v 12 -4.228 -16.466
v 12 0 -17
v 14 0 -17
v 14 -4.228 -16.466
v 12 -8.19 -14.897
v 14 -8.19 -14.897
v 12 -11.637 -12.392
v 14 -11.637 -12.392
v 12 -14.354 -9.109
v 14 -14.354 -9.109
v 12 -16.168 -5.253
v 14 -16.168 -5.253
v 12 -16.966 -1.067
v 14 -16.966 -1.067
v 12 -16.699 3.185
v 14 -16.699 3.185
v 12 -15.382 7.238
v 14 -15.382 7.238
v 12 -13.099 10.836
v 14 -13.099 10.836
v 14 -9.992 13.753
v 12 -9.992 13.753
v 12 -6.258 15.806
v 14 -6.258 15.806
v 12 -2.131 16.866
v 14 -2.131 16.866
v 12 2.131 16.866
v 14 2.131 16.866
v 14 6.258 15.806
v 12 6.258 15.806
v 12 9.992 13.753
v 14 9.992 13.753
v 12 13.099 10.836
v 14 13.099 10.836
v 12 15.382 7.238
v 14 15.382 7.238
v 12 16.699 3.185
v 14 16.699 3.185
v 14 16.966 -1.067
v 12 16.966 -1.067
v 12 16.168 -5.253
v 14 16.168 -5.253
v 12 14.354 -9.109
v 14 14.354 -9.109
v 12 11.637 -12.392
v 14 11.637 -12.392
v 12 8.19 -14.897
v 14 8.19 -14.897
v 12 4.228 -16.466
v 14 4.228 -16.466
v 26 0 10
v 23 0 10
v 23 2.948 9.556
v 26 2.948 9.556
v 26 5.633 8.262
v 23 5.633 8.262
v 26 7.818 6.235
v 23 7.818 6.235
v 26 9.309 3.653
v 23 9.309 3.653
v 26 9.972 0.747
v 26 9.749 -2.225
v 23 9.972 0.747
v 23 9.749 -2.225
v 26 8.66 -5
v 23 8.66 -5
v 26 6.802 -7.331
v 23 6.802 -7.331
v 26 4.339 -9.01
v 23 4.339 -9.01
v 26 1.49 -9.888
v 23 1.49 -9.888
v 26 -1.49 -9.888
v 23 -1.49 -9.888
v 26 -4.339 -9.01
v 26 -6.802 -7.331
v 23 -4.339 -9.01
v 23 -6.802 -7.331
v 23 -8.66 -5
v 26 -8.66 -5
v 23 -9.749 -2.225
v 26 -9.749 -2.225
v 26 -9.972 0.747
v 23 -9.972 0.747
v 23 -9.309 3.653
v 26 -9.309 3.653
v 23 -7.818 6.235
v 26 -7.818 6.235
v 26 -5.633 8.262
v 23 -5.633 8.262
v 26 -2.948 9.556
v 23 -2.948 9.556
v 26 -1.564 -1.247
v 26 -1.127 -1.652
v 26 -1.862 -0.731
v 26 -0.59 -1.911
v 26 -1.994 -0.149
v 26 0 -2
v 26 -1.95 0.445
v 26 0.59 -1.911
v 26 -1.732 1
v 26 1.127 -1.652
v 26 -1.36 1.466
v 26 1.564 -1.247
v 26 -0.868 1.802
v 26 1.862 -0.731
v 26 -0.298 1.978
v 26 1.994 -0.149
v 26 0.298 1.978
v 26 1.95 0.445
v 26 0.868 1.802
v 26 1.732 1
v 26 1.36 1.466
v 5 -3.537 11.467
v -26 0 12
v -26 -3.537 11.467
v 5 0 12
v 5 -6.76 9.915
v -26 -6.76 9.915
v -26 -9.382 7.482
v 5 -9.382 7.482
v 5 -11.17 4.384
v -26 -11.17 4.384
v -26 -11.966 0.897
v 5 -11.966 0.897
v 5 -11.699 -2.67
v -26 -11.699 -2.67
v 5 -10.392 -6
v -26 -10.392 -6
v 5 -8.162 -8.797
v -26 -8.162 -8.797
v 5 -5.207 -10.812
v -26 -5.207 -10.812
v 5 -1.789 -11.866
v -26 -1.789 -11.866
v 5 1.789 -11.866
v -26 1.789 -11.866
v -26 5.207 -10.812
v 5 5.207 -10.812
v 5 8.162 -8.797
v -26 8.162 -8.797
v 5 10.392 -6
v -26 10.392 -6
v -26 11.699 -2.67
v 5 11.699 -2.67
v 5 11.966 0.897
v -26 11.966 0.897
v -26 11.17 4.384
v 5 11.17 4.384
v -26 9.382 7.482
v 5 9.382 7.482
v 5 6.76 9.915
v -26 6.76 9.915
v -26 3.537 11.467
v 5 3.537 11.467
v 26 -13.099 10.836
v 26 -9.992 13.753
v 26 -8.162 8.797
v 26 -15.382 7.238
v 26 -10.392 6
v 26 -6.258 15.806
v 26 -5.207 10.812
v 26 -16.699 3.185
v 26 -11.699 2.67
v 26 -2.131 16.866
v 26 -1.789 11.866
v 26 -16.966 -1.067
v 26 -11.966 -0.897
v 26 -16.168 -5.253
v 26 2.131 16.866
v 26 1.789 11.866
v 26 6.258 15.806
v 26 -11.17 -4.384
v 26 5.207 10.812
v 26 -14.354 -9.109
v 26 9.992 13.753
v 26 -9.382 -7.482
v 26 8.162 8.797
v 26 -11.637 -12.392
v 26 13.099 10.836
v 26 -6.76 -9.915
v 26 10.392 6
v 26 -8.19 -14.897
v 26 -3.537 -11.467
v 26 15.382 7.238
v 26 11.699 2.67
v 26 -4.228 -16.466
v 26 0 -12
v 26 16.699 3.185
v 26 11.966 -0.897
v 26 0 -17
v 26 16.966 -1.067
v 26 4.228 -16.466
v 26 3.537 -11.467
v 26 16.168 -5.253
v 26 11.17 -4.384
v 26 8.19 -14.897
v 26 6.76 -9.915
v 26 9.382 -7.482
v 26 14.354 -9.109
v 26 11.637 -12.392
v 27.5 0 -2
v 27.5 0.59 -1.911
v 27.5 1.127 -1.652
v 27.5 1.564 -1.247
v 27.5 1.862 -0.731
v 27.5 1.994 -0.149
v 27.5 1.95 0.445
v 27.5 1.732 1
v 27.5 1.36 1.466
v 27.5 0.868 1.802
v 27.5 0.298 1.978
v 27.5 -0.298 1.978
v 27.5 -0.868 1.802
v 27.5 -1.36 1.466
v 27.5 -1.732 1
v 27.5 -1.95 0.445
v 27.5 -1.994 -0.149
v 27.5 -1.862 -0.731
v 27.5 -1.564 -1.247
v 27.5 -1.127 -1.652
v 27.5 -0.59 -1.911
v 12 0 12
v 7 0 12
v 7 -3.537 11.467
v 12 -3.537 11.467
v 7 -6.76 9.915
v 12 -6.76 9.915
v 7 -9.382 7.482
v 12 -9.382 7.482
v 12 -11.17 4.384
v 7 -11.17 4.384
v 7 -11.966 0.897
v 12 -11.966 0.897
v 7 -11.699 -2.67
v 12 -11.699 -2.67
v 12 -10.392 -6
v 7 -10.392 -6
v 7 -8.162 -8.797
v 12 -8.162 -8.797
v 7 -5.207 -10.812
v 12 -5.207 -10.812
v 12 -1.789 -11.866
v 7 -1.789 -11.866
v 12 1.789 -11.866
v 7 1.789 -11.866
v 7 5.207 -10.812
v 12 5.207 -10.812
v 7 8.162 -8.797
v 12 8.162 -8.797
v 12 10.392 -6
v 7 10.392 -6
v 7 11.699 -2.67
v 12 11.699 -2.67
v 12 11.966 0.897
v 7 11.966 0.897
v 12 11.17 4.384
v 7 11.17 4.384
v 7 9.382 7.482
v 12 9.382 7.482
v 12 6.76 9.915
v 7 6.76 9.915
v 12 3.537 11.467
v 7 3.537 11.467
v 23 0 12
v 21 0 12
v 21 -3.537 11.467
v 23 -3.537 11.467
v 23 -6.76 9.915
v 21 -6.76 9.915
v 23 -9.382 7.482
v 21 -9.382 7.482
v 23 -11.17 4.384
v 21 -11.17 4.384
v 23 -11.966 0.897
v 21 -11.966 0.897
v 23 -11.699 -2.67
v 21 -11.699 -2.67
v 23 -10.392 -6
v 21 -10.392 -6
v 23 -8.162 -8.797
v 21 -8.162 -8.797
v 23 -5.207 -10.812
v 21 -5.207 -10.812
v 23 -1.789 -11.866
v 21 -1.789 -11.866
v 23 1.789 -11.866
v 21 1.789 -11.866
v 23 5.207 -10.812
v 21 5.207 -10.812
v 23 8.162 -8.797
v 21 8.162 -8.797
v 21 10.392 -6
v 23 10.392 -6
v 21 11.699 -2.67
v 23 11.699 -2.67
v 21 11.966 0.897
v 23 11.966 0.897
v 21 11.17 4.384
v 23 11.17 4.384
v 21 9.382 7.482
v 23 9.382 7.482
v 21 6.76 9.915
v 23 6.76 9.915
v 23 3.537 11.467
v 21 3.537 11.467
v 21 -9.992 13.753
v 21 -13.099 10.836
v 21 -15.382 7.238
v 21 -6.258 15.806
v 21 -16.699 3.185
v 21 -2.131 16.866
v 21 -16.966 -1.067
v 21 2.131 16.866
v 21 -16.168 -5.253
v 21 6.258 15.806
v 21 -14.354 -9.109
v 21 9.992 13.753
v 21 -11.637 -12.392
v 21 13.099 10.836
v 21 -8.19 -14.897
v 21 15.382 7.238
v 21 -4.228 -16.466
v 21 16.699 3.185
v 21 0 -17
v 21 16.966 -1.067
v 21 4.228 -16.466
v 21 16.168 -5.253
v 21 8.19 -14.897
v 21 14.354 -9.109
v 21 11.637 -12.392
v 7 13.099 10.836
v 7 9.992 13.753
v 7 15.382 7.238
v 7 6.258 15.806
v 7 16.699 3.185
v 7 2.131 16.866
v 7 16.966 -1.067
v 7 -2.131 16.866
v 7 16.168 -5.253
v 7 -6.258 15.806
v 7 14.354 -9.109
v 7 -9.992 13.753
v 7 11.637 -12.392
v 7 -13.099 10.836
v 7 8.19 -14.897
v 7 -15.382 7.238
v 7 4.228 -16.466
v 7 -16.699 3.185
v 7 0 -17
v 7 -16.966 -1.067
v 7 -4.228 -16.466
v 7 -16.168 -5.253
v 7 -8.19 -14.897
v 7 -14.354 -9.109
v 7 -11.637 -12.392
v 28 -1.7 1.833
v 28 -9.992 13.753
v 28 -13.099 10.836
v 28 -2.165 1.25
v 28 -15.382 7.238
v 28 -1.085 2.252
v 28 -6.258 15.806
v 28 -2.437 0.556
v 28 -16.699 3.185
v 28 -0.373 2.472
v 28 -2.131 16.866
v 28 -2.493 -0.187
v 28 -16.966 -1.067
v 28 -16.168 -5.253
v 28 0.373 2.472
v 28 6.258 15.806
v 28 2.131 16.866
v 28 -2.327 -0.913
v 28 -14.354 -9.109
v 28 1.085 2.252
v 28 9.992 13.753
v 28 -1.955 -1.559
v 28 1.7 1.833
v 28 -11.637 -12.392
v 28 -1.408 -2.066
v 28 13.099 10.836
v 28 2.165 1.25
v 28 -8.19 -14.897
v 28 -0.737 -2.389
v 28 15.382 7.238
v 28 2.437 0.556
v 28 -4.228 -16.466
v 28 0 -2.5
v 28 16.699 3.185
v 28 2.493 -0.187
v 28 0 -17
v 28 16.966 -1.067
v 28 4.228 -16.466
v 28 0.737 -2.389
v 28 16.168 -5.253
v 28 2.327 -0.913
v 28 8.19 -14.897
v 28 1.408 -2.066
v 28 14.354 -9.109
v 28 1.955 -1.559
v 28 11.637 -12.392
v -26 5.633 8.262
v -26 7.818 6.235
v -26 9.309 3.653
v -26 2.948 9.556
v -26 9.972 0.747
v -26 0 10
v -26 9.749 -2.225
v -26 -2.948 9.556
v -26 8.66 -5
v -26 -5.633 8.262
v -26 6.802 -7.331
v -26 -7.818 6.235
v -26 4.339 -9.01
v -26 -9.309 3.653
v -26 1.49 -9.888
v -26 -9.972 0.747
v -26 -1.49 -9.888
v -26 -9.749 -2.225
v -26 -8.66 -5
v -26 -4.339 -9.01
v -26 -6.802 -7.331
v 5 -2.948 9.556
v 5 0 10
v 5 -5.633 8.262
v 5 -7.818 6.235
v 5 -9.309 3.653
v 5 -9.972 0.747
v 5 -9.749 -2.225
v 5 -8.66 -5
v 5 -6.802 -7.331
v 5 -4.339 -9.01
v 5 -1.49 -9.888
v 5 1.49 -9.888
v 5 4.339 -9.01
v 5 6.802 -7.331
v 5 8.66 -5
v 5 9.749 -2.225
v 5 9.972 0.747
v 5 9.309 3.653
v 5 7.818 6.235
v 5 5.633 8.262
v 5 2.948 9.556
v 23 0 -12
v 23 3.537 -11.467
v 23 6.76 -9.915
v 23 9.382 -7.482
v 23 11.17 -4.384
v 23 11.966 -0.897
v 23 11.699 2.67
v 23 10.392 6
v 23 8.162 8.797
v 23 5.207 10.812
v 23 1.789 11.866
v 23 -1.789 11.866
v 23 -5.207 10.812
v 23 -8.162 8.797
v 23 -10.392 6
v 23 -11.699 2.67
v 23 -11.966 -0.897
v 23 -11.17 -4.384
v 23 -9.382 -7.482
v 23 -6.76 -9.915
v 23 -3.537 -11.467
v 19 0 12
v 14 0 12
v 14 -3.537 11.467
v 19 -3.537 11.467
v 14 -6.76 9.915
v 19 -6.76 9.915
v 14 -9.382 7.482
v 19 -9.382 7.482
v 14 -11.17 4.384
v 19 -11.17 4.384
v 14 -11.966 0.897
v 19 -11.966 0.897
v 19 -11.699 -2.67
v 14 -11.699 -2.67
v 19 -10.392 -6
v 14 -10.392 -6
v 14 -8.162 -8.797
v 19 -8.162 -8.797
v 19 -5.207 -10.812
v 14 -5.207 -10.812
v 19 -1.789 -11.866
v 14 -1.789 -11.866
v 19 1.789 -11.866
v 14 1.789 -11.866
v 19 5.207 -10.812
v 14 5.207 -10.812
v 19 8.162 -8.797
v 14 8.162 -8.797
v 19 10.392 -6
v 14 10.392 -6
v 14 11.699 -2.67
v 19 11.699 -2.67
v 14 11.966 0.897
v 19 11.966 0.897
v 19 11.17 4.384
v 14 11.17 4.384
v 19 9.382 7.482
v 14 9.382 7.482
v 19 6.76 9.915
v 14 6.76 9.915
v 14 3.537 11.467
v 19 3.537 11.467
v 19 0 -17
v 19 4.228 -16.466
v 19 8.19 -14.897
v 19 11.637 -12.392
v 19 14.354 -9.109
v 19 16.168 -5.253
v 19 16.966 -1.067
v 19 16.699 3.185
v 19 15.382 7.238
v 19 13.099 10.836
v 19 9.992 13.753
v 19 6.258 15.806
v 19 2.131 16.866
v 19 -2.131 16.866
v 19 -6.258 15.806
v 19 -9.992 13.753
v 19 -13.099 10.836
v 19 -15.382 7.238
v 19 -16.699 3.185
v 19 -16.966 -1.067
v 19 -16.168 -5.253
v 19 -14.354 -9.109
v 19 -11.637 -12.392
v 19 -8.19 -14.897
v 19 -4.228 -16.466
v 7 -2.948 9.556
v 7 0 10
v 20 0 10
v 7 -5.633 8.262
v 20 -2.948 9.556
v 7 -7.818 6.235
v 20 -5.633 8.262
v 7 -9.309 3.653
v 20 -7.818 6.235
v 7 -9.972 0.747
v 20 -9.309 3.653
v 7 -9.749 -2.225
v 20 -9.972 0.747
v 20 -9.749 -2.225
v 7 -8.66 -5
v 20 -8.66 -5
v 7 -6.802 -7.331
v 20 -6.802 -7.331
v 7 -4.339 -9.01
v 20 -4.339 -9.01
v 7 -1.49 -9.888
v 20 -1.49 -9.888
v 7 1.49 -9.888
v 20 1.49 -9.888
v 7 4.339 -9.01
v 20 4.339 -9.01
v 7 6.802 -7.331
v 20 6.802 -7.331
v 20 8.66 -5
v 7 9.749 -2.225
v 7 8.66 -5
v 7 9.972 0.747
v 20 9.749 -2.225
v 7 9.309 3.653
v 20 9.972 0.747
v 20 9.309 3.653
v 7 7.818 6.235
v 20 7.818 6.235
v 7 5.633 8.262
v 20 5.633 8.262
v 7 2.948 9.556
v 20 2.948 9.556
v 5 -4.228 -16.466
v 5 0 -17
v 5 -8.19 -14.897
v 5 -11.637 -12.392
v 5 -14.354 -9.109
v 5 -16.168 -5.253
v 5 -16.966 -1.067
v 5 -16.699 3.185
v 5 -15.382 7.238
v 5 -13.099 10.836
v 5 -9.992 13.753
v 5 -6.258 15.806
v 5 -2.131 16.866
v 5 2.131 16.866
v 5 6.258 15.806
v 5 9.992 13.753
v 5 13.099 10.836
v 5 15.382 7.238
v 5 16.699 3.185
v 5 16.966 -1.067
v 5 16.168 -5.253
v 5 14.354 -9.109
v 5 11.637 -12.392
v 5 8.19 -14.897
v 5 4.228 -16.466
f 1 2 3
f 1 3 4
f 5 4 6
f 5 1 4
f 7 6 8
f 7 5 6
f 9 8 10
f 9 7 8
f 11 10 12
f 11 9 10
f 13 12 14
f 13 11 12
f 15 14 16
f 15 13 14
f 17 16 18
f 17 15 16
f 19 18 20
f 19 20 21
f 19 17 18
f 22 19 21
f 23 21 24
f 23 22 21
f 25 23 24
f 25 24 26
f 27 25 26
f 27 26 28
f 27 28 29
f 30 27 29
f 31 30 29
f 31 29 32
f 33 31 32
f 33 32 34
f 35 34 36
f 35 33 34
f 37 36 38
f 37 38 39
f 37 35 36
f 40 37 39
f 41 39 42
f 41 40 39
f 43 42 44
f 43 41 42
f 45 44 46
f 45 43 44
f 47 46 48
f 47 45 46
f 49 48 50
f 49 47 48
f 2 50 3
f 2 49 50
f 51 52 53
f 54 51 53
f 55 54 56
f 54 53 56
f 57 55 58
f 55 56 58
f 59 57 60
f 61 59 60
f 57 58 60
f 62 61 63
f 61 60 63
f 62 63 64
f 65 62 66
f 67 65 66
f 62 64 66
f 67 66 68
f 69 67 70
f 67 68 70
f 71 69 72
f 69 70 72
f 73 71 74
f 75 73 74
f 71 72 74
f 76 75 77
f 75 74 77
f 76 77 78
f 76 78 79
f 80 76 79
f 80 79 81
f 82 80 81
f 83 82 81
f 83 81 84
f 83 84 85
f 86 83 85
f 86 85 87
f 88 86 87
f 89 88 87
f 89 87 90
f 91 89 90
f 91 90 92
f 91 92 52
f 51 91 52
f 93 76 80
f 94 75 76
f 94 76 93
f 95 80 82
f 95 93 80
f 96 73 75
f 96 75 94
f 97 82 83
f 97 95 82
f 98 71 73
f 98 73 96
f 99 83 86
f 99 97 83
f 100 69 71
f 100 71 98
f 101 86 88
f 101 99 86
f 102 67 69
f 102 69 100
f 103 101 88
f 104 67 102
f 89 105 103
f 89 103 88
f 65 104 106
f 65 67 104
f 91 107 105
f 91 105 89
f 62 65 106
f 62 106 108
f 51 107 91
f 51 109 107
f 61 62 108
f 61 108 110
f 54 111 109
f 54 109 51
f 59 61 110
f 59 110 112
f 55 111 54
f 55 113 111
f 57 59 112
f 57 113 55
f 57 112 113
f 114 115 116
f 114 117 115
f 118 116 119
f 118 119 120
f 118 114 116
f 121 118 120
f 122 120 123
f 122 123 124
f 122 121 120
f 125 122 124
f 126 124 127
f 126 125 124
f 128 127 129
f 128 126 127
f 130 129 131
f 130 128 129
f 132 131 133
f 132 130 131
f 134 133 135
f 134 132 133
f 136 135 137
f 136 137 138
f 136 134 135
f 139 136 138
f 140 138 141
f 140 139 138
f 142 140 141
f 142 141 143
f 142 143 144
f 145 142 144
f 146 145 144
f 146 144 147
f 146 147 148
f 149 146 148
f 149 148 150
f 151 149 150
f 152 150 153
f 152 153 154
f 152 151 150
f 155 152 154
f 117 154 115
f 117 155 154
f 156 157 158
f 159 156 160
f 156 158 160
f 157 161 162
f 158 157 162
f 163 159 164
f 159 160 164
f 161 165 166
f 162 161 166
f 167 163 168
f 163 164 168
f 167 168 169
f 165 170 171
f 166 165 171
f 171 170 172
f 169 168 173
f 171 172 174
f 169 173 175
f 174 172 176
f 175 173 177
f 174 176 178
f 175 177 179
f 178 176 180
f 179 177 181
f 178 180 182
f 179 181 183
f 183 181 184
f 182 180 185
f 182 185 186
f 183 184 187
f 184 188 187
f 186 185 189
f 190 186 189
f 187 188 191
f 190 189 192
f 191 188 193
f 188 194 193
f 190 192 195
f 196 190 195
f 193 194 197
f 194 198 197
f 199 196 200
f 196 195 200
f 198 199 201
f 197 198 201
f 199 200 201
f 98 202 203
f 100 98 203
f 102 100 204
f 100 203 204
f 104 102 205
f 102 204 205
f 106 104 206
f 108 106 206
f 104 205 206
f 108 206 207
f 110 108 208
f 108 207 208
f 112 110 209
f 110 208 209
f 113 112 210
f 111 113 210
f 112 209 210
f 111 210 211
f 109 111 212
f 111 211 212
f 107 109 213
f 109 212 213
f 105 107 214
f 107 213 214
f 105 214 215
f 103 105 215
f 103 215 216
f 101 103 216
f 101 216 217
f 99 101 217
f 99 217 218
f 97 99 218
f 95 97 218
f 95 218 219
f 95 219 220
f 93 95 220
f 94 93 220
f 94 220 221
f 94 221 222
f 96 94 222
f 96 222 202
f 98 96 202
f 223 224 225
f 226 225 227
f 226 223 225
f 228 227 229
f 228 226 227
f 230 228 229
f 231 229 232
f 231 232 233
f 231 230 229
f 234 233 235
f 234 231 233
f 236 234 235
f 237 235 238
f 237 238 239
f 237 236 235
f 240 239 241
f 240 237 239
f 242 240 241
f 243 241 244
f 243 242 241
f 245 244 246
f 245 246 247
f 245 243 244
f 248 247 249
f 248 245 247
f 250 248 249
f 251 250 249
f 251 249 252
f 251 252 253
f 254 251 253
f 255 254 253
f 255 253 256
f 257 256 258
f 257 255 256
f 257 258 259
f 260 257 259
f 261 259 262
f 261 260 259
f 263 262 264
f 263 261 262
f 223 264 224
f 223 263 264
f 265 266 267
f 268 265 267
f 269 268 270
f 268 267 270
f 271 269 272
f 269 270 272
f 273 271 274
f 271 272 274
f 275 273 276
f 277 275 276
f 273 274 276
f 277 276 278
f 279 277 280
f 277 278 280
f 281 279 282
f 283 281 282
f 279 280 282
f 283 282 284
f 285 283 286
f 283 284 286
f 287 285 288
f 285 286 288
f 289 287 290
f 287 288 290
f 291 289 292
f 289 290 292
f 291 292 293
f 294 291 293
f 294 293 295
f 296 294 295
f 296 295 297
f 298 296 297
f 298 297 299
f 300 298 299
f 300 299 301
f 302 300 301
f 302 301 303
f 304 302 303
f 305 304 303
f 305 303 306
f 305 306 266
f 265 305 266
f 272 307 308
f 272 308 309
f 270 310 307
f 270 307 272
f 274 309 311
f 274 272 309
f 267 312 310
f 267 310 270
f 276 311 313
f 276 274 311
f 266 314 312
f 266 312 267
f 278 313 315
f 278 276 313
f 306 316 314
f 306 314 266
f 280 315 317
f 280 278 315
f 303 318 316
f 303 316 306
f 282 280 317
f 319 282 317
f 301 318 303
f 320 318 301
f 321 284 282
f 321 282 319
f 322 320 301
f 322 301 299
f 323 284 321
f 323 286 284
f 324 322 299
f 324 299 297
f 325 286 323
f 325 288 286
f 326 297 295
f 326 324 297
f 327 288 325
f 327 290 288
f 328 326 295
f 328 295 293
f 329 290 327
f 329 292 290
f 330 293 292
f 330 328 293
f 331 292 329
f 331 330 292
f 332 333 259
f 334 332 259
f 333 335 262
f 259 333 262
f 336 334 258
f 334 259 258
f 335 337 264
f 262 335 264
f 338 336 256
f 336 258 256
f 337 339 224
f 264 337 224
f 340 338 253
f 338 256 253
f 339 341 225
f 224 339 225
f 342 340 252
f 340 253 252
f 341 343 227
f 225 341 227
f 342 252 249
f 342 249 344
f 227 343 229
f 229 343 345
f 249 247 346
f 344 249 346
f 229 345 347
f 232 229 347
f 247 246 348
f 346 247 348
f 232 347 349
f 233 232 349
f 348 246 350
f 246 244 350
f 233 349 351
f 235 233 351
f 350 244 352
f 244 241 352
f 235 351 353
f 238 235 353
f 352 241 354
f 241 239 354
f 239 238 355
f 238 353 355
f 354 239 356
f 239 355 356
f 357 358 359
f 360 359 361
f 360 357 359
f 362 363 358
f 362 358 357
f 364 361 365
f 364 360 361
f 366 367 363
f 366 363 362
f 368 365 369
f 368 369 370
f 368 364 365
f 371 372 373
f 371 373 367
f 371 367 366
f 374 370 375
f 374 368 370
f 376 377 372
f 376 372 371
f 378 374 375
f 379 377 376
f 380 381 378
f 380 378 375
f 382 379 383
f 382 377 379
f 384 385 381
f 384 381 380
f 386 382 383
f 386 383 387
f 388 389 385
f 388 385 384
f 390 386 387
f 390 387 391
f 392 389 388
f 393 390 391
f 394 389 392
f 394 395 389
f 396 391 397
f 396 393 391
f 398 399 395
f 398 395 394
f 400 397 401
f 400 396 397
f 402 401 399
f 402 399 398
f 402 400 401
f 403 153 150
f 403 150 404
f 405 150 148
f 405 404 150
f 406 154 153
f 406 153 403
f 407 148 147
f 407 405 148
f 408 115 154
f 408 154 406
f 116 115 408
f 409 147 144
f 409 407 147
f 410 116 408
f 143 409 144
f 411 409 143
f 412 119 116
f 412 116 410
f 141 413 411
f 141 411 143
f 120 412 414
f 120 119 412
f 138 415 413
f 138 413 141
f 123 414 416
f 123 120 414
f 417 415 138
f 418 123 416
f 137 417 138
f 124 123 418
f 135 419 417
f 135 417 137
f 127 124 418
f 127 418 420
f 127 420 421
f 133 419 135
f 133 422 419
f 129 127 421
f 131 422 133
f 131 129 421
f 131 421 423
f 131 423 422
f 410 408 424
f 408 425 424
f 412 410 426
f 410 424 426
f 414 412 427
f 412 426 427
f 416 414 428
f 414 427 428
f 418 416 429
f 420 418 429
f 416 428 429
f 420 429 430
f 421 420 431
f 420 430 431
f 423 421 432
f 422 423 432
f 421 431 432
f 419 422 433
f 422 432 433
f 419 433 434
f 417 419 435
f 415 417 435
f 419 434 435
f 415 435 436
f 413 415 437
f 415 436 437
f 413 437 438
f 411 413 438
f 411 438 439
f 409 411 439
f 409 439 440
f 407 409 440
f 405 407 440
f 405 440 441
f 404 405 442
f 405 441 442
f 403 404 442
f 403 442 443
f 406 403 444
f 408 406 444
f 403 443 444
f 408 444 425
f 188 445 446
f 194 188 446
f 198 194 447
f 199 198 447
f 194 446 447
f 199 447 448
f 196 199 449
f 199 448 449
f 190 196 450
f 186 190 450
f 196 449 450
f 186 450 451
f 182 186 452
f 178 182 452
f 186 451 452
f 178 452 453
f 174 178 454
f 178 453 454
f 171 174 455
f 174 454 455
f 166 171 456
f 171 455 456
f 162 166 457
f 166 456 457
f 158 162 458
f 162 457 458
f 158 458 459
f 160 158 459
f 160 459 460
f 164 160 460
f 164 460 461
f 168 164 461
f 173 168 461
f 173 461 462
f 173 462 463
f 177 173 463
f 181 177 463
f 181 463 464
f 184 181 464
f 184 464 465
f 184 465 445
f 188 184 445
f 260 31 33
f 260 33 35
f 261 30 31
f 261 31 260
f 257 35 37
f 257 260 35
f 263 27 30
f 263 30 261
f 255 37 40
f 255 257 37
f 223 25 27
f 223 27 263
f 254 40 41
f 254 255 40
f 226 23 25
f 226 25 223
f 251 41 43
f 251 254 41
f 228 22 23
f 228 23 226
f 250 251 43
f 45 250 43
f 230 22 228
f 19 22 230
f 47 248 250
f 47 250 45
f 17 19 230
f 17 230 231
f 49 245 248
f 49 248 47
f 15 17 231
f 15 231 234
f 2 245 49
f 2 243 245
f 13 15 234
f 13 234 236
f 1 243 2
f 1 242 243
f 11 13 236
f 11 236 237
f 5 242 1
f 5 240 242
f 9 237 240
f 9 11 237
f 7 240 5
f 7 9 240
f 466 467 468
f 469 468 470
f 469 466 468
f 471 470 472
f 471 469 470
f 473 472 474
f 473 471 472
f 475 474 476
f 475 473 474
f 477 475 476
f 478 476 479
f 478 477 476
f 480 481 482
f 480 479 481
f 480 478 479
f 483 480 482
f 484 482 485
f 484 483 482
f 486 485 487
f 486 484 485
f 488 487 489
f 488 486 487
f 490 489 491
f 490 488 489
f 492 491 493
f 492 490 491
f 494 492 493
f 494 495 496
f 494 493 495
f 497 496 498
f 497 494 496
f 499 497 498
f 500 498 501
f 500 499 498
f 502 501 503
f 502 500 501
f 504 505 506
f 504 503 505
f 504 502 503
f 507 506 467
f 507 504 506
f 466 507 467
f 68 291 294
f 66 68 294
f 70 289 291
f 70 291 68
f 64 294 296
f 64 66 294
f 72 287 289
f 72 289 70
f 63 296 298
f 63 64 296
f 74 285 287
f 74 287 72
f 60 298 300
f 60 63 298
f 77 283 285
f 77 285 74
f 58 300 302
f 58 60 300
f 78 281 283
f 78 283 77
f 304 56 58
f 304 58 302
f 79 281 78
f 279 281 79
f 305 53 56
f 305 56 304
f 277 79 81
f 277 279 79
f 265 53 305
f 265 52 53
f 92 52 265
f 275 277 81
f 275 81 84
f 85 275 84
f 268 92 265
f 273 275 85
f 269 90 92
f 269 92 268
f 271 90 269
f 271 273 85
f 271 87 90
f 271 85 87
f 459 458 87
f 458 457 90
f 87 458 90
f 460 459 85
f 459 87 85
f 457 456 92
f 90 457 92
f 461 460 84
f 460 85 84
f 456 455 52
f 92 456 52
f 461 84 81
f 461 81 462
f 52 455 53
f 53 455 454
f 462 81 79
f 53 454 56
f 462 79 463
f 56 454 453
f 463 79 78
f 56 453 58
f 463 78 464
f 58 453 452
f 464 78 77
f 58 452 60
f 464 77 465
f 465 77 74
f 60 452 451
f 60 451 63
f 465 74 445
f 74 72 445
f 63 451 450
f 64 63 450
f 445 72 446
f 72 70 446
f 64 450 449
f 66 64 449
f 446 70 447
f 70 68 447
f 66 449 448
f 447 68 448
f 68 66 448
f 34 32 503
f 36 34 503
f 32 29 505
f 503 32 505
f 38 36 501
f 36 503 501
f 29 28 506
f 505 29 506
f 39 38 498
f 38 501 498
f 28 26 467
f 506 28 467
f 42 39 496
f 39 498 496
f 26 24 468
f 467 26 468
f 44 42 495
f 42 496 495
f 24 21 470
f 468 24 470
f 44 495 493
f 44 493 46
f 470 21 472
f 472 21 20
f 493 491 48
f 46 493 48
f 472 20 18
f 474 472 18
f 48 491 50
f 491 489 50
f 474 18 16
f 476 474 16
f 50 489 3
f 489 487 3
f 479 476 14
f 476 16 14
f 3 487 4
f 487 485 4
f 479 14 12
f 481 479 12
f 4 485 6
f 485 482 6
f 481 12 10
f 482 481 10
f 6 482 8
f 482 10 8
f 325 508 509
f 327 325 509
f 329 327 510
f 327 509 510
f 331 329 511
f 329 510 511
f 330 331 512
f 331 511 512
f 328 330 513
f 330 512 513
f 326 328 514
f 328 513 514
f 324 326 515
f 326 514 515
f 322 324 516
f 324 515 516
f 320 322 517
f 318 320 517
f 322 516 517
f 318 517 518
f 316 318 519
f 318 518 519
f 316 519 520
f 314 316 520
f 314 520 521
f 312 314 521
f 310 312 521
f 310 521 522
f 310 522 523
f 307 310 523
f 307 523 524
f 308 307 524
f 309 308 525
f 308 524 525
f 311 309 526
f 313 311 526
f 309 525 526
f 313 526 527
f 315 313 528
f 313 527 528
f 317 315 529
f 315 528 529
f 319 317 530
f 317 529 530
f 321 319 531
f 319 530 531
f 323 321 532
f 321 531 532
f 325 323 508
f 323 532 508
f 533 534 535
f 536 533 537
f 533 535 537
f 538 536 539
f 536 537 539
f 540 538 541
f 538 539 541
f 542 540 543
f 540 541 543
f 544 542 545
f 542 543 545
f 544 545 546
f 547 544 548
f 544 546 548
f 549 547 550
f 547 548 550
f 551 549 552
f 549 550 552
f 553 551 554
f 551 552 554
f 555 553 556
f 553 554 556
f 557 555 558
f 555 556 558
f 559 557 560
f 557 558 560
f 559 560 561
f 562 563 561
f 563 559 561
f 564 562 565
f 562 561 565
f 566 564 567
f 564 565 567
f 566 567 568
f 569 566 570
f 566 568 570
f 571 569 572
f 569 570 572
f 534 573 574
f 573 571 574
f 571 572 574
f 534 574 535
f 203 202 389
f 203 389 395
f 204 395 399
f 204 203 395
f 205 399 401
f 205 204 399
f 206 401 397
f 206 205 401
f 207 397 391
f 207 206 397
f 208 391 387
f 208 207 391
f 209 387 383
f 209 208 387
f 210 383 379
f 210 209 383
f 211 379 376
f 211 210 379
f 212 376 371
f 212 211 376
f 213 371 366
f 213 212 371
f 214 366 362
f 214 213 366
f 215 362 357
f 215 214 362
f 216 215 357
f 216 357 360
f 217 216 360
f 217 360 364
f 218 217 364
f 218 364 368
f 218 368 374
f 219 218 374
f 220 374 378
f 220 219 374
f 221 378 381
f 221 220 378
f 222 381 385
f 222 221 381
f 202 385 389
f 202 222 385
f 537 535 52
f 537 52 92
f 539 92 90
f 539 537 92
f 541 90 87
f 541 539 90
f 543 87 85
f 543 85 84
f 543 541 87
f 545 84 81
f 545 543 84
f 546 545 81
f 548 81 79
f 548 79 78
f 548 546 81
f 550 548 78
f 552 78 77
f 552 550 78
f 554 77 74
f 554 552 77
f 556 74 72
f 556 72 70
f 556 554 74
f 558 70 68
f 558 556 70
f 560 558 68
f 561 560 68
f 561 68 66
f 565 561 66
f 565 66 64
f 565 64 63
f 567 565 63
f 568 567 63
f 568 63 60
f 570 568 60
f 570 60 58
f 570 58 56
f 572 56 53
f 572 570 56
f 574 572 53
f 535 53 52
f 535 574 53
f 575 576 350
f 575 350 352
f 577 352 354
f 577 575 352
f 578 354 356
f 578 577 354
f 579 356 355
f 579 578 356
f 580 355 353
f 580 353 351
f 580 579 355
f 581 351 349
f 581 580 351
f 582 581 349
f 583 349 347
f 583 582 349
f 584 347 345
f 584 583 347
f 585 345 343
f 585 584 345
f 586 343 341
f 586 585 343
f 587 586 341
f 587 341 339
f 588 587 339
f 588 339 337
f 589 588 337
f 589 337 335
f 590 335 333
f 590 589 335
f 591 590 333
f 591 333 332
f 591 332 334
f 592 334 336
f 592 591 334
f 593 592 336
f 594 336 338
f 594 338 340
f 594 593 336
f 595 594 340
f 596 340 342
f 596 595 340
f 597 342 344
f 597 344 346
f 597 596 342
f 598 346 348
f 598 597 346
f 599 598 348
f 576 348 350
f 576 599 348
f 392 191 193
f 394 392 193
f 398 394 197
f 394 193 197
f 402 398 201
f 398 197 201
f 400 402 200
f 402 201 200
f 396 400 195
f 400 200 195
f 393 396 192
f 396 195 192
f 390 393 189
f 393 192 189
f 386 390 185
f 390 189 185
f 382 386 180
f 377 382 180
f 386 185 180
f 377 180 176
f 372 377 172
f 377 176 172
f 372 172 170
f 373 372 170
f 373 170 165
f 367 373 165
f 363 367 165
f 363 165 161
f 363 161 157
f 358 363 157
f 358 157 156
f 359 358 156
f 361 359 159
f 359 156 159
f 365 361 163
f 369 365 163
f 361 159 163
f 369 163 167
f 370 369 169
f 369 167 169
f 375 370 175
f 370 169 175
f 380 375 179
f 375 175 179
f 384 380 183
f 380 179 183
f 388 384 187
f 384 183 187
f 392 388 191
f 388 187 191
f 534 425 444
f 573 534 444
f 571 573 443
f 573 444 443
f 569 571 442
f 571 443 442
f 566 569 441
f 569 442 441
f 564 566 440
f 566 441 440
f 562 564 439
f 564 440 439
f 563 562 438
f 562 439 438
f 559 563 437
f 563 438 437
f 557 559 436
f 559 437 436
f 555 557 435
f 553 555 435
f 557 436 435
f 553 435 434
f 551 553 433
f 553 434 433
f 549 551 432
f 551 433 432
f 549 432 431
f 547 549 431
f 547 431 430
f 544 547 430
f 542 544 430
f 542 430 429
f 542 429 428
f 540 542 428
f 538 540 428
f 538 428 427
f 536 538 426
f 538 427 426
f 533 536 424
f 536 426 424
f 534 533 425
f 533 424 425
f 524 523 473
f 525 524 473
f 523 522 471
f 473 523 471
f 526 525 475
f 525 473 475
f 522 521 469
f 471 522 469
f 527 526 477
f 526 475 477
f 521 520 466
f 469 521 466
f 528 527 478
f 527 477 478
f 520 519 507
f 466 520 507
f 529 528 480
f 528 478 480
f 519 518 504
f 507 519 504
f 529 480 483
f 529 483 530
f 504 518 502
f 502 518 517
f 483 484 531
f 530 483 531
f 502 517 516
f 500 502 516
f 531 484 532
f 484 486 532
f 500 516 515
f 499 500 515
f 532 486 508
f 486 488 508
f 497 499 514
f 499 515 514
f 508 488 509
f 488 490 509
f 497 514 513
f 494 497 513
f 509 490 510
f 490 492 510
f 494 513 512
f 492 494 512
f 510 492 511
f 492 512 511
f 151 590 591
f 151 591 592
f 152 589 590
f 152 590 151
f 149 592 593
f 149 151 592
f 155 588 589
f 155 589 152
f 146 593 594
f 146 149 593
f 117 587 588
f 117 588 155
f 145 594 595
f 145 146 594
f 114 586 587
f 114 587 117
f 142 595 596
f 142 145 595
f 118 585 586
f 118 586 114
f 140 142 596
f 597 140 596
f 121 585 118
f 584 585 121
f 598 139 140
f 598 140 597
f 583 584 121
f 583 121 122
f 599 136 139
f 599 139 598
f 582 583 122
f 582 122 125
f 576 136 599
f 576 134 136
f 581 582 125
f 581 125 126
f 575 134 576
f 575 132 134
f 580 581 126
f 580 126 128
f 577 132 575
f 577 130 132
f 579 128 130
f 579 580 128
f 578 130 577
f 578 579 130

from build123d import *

# Parameters (mm, degrees)
SKETCH_1_W          = 46
SKETCH_1_H          = 2
SKETCH_8_R          = 12
SKETCH_8_R_2        = 10
EXTRUDE_3_DEPTH     = 3
SKETCH_9_R          = 12
EXTRUDE_5_DEPTH     = 5
SKETCH_11_R         = 10
CUT_EXTRUDE_7_DEPTH = 52
SKETCH_12_R         = 2
CUT_EXTRUDE_8_DEPTH = 57.603886792
CHAMFER_1_SIZE      = 0.5
EXTRUDE_START       = -2
SKETCH_14_R         = 17
SKETCH_14_R_2       = 12
EXTRUDE_6_DEPTH     = 2
EXTRUDE_START_2     = -9
SKETCH_15_R         = 17
SKETCH_15_R_2       = 12
EXTRUDE_7_DEPTH     = 2
EXTRUDE_START_3     = 7
SKETCH_20_R         = 17
SKETCH_20_R_2       = 12
EXTRUDE_11_DEPTH    = 2
SKETCH_21_R         = 17
SKETCH_21_R_2       = 10
EXTRUDE_12_DEPTH    = 2


with BuildPart() as part:
    # 草图1 → 旋转1 (revolve)
    with BuildSketch(Plane.XY):
        with Locations((-3, 11)):
            Rectangle(SKETCH_1_W, SKETCH_1_H)
    revolve(axis=Axis((-26, 0, 0), (1, 0, 0)))

    # 草图8 → 凸台-拉伸3 (add)
    with BuildSketch(Plane(origin=(20, 0, 0), x_dir=(0, 0, -1), z_dir=(1, 0, 0))):
        Circle(SKETCH_8_R)
        Circle(SKETCH_8_R_2, mode=Mode.SUBTRACT)
    extrude(amount=EXTRUDE_3_DEPTH)

    # 草图15 → 凸台-拉伸7 (add)
    with BuildSketch(Plane(origin=(28, 0, 0), x_dir=(0, 0, -1), z_dir=(1, 0, 0)).offset(EXTRUDE_START_2)):
        Circle(SKETCH_15_R)
        Circle(SKETCH_15_R_2, mode=Mode.SUBTRACT)
    extrude(amount=EXTRUDE_7_DEPTH)

    # 草图20 → 凸台-拉伸11 (add)
    with BuildSketch(Plane.ZY.offset(-19).offset(EXTRUDE_START_3)):
        Circle(SKETCH_20_R)
        Circle(SKETCH_20_R_2, mode=Mode.SUBTRACT)
    extrude(amount=-EXTRUDE_11_DEPTH)

    # 草图21 → 凸台-拉伸12 (add)
    with BuildSketch(Plane.ZY.offset(-12).offset(EXTRUDE_START_3)):
        Circle(SKETCH_21_R)
        Circle(SKETCH_21_R_2, mode=Mode.SUBTRACT)
    extrude(amount=-EXTRUDE_12_DEPTH)


with BuildPart() as body_2:
    # 草图9 → 凸台-拉伸5 (new body)
    with BuildSketch(Plane(origin=(23, 0, 0), x_dir=(0, 0, -1), z_dir=(1, 0, 0))):
        Circle(SKETCH_9_R)
    extrude(amount=EXTRUDE_5_DEPTH)

    # 草图11 → 切除-拉伸7 (cut)
    with BuildSketch(Plane.ZY.offset(26)):
        Circle(SKETCH_11_R)
    extrude(amount=-CUT_EXTRUDE_7_DEPTH, mode=Mode.SUBTRACT)

    # 草图12 → 切除-拉伸8 (cut, through all)
    with BuildSketch(Plane(origin=(28, 0, 0), x_dir=(0, 0, -1), z_dir=(1, 0, 0))):
        Circle(SKETCH_12_R)
    extrude(amount=-CUT_EXTRUDE_8_DEPTH, mode=Mode.SUBTRACT)

    # 倒角1
    chamfer_1_edges = [body_2.edges().sort_by_distance(p)[0] for p in [
        (28, 0, 2),
    ]]
    chamfer(chamfer_1_edges, length=CHAMFER_1_SIZE)

    # 草图14 → 凸台-拉伸6 (add)
    with BuildSketch(Plane(origin=(28, 0, 0), x_dir=(0, 0, -1), z_dir=(1, 0, 0)).offset(EXTRUDE_START)):
        Circle(SKETCH_14_R)
        Circle(SKETCH_14_R_2, mode=Mode.SUBTRACT)
    extrude(amount=EXTRUDE_6_DEPTH)


solid = Compound([part.part, body_2.part])
